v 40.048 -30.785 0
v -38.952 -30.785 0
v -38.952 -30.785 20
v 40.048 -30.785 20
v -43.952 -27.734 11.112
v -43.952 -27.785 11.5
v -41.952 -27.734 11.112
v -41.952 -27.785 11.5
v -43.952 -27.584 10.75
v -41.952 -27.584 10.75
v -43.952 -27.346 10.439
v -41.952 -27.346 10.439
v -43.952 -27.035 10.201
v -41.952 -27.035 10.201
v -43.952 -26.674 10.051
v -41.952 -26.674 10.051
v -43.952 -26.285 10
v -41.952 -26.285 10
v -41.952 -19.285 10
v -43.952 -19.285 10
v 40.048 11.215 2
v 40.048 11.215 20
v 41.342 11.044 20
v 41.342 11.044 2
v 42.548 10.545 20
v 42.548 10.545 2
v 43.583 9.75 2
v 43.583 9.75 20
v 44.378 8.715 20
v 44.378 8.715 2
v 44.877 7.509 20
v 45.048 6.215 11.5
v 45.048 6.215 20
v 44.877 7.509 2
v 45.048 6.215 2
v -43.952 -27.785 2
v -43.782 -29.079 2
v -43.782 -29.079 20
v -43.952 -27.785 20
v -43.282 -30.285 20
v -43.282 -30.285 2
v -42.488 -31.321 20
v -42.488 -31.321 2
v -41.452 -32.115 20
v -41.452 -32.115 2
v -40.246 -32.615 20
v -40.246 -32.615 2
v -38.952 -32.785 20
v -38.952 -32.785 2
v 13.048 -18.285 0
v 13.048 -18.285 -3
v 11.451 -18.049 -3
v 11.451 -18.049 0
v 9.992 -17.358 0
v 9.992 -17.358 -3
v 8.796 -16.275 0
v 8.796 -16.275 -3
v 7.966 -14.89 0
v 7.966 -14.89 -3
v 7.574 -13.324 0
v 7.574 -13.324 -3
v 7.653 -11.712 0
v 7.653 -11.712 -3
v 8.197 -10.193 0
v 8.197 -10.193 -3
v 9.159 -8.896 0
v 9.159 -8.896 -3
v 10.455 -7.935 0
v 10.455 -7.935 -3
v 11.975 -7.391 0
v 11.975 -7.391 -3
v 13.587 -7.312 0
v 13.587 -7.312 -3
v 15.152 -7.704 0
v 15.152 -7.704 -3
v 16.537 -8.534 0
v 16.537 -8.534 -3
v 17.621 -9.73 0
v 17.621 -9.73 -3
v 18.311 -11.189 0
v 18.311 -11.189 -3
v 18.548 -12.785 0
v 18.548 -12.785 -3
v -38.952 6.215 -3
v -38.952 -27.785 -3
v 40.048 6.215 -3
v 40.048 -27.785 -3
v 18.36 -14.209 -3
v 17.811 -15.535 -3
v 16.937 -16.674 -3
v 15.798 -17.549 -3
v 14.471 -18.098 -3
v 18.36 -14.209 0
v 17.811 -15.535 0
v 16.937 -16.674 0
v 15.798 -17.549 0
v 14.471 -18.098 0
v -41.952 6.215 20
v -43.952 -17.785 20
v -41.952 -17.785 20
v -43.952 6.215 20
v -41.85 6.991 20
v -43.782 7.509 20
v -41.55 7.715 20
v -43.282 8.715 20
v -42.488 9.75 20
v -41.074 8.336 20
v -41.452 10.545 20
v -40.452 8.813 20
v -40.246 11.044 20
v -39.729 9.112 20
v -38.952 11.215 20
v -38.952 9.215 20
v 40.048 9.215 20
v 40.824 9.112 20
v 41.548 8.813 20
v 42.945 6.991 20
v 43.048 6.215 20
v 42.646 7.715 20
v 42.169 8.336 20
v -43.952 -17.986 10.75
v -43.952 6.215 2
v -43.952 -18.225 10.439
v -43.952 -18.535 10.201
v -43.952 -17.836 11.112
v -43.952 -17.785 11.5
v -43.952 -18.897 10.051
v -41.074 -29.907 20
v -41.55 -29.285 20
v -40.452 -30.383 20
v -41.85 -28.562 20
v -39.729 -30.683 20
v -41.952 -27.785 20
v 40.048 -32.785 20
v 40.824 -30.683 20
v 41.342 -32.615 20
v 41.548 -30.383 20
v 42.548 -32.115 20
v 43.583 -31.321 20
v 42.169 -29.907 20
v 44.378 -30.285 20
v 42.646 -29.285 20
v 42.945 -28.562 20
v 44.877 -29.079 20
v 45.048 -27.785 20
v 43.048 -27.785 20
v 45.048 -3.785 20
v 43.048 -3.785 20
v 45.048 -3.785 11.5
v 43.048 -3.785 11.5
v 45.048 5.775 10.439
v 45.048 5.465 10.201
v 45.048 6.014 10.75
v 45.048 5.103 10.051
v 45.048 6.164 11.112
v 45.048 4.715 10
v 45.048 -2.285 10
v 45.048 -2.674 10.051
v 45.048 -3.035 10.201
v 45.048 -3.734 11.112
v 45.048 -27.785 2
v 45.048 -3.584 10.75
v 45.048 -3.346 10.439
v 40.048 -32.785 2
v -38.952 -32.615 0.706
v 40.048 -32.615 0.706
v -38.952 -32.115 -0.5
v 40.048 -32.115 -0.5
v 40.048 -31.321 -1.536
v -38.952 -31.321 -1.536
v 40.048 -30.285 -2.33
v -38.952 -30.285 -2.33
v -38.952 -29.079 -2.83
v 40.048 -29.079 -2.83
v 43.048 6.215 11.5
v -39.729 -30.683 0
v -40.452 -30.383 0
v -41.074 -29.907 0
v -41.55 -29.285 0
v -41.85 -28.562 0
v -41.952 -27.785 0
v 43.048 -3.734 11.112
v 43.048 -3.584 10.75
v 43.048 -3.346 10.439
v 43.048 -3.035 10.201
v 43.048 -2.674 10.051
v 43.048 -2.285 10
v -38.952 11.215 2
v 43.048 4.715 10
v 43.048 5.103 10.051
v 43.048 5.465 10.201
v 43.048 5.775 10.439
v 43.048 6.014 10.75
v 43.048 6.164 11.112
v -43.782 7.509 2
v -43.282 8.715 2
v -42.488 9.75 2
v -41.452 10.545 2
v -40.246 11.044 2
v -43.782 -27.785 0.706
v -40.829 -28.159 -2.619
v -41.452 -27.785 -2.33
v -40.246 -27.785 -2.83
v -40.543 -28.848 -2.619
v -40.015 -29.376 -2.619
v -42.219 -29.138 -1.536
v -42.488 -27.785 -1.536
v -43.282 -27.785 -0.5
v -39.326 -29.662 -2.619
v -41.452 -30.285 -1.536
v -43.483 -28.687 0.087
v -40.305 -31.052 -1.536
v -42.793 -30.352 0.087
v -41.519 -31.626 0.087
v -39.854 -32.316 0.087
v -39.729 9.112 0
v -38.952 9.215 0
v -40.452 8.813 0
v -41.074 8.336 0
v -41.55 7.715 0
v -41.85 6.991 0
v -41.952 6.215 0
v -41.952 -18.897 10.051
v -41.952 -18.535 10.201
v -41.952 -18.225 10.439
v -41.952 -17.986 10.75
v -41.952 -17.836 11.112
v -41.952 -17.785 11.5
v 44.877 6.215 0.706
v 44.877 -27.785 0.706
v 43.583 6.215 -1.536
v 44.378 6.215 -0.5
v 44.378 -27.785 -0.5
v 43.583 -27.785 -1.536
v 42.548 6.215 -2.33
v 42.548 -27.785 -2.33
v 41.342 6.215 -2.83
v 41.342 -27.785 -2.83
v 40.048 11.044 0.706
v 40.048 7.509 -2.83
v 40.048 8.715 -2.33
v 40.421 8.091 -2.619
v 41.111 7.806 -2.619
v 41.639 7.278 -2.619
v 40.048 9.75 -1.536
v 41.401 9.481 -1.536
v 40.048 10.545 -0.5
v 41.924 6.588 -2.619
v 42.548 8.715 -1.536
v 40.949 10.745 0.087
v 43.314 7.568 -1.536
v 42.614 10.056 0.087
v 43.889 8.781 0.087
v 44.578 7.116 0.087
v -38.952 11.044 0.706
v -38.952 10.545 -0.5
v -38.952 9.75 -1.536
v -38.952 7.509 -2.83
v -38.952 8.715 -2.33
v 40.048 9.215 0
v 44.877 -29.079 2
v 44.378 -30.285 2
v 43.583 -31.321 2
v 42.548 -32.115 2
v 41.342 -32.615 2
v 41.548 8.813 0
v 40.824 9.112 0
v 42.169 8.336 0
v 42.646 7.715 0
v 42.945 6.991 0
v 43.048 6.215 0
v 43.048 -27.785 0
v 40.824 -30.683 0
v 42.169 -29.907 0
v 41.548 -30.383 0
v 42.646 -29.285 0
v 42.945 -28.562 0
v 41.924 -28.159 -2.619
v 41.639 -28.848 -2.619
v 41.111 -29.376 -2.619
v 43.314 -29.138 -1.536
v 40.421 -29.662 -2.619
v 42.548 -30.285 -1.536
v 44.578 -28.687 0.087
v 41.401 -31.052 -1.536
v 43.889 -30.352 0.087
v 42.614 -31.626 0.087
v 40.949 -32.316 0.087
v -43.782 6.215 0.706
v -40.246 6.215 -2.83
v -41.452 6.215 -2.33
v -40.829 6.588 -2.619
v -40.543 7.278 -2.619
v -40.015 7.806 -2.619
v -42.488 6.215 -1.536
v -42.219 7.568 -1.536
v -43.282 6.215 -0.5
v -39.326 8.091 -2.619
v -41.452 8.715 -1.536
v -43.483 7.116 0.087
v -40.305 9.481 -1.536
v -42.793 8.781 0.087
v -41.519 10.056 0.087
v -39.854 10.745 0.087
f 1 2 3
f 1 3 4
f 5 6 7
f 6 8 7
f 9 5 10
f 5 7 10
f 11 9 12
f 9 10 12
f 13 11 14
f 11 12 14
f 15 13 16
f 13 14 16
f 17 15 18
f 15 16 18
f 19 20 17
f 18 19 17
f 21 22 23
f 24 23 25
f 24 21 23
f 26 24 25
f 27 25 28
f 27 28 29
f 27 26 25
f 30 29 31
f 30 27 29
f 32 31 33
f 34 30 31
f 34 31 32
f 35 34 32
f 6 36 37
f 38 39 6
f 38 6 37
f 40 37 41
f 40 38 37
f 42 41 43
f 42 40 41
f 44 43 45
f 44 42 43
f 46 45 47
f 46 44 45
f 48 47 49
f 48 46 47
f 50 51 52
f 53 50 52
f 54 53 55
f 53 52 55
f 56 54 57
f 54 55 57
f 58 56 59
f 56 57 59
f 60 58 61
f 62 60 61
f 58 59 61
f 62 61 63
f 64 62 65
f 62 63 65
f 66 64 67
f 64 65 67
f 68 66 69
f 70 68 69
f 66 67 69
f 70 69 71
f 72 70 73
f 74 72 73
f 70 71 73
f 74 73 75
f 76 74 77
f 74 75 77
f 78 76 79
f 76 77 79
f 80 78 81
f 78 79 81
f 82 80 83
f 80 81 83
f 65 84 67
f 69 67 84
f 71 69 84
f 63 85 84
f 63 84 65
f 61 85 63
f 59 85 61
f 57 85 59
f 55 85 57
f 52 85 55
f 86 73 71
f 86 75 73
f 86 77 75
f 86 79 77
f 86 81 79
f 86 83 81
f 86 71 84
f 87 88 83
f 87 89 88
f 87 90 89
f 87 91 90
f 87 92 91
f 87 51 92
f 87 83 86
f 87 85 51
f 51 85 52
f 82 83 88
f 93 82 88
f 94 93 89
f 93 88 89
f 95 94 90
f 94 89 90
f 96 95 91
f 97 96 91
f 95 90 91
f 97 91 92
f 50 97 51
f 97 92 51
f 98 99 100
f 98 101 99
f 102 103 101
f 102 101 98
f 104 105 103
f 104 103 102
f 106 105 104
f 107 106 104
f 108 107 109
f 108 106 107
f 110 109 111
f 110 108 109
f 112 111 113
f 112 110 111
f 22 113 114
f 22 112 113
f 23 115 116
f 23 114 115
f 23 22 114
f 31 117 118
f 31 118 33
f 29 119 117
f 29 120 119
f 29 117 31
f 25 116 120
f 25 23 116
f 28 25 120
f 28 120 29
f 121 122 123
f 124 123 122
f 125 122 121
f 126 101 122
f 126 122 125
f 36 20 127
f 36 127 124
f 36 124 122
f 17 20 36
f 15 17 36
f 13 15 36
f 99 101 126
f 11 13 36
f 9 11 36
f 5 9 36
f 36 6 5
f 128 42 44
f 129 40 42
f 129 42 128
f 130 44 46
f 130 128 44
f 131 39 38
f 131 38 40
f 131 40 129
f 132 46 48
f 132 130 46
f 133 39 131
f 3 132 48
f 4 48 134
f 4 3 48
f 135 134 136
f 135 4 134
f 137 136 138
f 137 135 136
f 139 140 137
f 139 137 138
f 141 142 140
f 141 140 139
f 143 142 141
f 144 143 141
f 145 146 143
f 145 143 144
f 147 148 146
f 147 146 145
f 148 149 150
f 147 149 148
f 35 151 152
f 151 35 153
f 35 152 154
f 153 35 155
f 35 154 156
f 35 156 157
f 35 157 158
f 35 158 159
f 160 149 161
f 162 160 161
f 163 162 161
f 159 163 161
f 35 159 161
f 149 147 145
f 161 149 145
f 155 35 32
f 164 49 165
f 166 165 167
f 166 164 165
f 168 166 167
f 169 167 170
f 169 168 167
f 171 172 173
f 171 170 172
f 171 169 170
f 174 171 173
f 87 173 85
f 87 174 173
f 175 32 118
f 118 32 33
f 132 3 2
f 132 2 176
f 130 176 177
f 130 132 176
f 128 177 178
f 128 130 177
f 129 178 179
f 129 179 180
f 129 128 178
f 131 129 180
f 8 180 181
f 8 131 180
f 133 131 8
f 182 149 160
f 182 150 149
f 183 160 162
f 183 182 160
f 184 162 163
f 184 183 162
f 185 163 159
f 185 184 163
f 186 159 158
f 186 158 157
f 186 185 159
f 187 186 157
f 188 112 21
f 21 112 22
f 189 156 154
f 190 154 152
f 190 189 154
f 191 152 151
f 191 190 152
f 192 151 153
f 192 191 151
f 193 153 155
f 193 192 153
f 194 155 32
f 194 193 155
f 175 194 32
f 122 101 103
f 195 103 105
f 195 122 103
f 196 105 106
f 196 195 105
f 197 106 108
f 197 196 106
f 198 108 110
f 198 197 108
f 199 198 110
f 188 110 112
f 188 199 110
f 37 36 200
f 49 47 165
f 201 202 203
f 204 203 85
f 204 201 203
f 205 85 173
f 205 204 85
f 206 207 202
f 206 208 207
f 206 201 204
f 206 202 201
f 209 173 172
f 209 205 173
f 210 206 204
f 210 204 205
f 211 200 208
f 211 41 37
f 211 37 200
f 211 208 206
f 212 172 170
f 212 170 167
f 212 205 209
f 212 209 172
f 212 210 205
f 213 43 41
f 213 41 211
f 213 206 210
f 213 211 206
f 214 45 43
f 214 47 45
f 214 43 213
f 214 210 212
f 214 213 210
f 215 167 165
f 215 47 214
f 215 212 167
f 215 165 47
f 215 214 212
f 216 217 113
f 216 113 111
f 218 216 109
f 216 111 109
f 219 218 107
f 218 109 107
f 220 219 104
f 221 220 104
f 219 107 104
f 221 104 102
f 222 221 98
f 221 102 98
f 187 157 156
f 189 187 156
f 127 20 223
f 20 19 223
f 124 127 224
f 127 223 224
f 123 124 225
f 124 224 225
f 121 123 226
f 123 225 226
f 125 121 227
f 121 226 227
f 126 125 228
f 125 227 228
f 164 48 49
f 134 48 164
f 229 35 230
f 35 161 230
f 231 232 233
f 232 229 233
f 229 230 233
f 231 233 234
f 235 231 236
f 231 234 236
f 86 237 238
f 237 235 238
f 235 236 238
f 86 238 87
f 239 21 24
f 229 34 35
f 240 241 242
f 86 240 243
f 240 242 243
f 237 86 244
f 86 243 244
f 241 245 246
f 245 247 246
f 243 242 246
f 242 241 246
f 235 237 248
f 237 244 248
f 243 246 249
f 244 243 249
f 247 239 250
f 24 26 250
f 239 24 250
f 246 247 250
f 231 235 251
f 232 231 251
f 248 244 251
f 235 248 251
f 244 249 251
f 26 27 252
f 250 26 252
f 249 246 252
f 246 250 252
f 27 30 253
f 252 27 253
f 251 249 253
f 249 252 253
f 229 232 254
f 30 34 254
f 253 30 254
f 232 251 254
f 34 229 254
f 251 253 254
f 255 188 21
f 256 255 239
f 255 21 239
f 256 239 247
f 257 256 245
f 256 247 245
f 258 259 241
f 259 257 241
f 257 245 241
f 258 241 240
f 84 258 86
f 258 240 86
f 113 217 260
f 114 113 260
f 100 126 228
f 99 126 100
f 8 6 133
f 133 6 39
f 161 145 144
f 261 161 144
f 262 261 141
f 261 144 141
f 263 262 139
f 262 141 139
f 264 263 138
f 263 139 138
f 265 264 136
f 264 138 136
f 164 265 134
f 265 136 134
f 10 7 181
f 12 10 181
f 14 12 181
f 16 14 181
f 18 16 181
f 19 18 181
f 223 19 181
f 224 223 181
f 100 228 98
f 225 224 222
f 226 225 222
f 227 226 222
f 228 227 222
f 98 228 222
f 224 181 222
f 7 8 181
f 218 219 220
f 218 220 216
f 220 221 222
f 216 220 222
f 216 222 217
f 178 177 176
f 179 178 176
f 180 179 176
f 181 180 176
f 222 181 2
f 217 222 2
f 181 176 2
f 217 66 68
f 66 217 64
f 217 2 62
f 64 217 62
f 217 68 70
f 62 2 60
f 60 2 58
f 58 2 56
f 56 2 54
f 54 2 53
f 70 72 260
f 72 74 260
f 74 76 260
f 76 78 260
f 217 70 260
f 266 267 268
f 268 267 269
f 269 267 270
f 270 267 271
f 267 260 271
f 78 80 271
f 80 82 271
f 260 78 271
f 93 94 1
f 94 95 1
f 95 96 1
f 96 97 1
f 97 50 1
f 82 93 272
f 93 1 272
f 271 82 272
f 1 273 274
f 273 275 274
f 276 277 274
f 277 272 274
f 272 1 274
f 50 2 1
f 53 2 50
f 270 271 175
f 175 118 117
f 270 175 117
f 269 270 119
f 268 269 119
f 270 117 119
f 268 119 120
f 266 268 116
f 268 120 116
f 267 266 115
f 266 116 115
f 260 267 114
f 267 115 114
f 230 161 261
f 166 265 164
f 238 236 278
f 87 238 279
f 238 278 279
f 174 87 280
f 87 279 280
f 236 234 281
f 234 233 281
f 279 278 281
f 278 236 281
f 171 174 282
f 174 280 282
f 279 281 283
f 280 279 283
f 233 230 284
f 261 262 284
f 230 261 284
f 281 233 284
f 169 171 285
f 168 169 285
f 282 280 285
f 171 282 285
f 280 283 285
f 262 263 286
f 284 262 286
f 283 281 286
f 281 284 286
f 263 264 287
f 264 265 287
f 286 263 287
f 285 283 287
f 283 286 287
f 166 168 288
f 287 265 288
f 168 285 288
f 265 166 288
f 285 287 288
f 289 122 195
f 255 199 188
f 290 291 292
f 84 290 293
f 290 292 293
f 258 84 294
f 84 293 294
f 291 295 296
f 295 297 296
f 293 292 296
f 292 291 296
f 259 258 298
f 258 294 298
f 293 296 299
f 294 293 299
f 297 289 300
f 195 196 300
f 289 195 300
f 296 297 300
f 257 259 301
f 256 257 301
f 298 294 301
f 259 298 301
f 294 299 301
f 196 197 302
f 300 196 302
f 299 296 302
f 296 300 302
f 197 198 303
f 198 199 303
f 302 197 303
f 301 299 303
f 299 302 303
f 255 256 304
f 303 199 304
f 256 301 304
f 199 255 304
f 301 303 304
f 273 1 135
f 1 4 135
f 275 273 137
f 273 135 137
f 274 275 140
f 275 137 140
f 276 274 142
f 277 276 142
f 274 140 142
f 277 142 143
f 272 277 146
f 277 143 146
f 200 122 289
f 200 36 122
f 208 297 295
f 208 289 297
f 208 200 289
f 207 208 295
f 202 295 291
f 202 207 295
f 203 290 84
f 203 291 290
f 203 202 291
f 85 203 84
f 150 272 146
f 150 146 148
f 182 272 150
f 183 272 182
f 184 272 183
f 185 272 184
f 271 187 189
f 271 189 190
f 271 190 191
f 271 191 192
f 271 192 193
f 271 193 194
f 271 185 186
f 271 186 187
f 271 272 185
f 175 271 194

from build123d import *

# Parameters (mm, degrees)
F0_W      = 89
F0_H      = 44
F0_W_2    = 85
F0_H_2    = 40
F1_DEPTH  = 20
F2_W      = 89
F2_H      = 44
F2_W_2    = 85
F2_H_2    = 40
F3_DEPTH  = 3
F4_R      = 5
F5_R      = 3
F6_W      = 10
F6_H      = 10
F7_DEPTH  = 3
F8_W      = 10
F8_H      = 10
F9_DEPTH  = 3
F10_R     = 1.5
F12_DEPTH = 25


with BuildPart() as f1:
    # F0 (on Top) → F1 (new body)
    with BuildSketch(Plane.XY):
        with Locations((0.5476979613, -10.7853626366)):
            Rectangle(F0_W, F0_H)
        with Locations((0.5476979613, -10.7853626366)):
            Rectangle(F0_W_2, F0_H_2, mode=Mode.SUBTRACT)
    extrude(amount=F1_DEPTH)

    # F2 (on face) → F3 (join)
    with BuildSketch(Plane(origin=(0, 0, 0), x_dir=(1, 0, 0), z_dir=(0, 0, -1))):
        with Locations((0.5476979613, 10.7853626366)):
            Rectangle(F2_W, F2_H)
        with Locations((0.5476979613, 10.7853626366)):
            Rectangle(F2_W_2, F2_H_2, mode=Mode.SUBTRACT)
        with Locations((0.5476979613, 10.7853626366)):
            Rectangle(F2_W_2, F2_H_2)
    extrude(amount=F3_DEPTH)

    # F4
    f4_edges = [f1.edges().sort_by_distance(p)[0] for p in [
        (-43.952302, -32.785363, 8.5),
        (45.047698, -32.785363, 8.5),
        (45.047698, 11.214637, 8.5),
        (-43.952302, 11.214637, 8.5),
        (-43.952302, -10.785363, -3),
        (0.547698, 11.214637, -3),
        (45.047698, -10.785363, -3),
        (0.547698, -32.785363, -3),
    ]]
    fillet(f4_edges, radius=F4_R)

    # F5
    f5_edges = [f1.edges().sort_by_distance(p)[0] for p in [
        (-41.952302, 9.214637, 10),
        (-41.952302, -30.785363, 10),
        (43.047698, 9.214637, 10),
        (43.047698, -30.785363, 10),
    ]]
    fillet(f5_edges, radius=F5_R)

    # F6 (on face) → F7 (cut)
    with BuildSketch(Plane.YZ.offset(45.0476979613)):
        with Locations((1.2146373634, 15)):
            Rectangle(F6_W, F6_H)
    extrude(amount=-F7_DEPTH, mode=Mode.SUBTRACT)

    # F8 (on face) → F9 (cut)
    with BuildSketch(Plane(origin=(-43.9523020387, 0, 0), x_dir=(0, -1, 0), z_dir=(-1, 0, 0))):
        with Locations((22.7853626366, 15)):
            Rectangle(F8_W, F8_H)
    extrude(amount=-F9_DEPTH, mode=Mode.SUBTRACT)

    # F10
    f10_edges = [f1.edges().sort_by_distance(p)[0] for p in [
        (44.047698, 6.214637, 10),
        (44.047698, -3.785363, 10),
        (-42.952302, -27.785363, 10),
        (-42.952302, -17.785363, 10),
    ]]
    fillet(f10_edges, radius=F10_R)

    # F11 (on face) → F12 (cut)
    with BuildSketch(Plane(origin=(0, 0, -3), x_dir=(1, 0, 0), z_dir=(0, 0, -1))):
        with BuildLine():
            ThreePointArc((18.5476979613, 12.7853626366), (16.9367852579, 16.6744499331), (13.0476979613, 18.2853626366))
            ThreePointArc((13.0476979613, 18.2853626366), (9.1586106648, 8.89627534), (18.5476979613, 12.7853626366))
        make_face()
    extrude(amount=-F12_DEPTH, mode=Mode.SUBTRACT)


with BuildPart() as f13_1:
    # F13: copy of F1
    add(f1.part.moved(Location((0, 0, 30))))


solid = f1.part
